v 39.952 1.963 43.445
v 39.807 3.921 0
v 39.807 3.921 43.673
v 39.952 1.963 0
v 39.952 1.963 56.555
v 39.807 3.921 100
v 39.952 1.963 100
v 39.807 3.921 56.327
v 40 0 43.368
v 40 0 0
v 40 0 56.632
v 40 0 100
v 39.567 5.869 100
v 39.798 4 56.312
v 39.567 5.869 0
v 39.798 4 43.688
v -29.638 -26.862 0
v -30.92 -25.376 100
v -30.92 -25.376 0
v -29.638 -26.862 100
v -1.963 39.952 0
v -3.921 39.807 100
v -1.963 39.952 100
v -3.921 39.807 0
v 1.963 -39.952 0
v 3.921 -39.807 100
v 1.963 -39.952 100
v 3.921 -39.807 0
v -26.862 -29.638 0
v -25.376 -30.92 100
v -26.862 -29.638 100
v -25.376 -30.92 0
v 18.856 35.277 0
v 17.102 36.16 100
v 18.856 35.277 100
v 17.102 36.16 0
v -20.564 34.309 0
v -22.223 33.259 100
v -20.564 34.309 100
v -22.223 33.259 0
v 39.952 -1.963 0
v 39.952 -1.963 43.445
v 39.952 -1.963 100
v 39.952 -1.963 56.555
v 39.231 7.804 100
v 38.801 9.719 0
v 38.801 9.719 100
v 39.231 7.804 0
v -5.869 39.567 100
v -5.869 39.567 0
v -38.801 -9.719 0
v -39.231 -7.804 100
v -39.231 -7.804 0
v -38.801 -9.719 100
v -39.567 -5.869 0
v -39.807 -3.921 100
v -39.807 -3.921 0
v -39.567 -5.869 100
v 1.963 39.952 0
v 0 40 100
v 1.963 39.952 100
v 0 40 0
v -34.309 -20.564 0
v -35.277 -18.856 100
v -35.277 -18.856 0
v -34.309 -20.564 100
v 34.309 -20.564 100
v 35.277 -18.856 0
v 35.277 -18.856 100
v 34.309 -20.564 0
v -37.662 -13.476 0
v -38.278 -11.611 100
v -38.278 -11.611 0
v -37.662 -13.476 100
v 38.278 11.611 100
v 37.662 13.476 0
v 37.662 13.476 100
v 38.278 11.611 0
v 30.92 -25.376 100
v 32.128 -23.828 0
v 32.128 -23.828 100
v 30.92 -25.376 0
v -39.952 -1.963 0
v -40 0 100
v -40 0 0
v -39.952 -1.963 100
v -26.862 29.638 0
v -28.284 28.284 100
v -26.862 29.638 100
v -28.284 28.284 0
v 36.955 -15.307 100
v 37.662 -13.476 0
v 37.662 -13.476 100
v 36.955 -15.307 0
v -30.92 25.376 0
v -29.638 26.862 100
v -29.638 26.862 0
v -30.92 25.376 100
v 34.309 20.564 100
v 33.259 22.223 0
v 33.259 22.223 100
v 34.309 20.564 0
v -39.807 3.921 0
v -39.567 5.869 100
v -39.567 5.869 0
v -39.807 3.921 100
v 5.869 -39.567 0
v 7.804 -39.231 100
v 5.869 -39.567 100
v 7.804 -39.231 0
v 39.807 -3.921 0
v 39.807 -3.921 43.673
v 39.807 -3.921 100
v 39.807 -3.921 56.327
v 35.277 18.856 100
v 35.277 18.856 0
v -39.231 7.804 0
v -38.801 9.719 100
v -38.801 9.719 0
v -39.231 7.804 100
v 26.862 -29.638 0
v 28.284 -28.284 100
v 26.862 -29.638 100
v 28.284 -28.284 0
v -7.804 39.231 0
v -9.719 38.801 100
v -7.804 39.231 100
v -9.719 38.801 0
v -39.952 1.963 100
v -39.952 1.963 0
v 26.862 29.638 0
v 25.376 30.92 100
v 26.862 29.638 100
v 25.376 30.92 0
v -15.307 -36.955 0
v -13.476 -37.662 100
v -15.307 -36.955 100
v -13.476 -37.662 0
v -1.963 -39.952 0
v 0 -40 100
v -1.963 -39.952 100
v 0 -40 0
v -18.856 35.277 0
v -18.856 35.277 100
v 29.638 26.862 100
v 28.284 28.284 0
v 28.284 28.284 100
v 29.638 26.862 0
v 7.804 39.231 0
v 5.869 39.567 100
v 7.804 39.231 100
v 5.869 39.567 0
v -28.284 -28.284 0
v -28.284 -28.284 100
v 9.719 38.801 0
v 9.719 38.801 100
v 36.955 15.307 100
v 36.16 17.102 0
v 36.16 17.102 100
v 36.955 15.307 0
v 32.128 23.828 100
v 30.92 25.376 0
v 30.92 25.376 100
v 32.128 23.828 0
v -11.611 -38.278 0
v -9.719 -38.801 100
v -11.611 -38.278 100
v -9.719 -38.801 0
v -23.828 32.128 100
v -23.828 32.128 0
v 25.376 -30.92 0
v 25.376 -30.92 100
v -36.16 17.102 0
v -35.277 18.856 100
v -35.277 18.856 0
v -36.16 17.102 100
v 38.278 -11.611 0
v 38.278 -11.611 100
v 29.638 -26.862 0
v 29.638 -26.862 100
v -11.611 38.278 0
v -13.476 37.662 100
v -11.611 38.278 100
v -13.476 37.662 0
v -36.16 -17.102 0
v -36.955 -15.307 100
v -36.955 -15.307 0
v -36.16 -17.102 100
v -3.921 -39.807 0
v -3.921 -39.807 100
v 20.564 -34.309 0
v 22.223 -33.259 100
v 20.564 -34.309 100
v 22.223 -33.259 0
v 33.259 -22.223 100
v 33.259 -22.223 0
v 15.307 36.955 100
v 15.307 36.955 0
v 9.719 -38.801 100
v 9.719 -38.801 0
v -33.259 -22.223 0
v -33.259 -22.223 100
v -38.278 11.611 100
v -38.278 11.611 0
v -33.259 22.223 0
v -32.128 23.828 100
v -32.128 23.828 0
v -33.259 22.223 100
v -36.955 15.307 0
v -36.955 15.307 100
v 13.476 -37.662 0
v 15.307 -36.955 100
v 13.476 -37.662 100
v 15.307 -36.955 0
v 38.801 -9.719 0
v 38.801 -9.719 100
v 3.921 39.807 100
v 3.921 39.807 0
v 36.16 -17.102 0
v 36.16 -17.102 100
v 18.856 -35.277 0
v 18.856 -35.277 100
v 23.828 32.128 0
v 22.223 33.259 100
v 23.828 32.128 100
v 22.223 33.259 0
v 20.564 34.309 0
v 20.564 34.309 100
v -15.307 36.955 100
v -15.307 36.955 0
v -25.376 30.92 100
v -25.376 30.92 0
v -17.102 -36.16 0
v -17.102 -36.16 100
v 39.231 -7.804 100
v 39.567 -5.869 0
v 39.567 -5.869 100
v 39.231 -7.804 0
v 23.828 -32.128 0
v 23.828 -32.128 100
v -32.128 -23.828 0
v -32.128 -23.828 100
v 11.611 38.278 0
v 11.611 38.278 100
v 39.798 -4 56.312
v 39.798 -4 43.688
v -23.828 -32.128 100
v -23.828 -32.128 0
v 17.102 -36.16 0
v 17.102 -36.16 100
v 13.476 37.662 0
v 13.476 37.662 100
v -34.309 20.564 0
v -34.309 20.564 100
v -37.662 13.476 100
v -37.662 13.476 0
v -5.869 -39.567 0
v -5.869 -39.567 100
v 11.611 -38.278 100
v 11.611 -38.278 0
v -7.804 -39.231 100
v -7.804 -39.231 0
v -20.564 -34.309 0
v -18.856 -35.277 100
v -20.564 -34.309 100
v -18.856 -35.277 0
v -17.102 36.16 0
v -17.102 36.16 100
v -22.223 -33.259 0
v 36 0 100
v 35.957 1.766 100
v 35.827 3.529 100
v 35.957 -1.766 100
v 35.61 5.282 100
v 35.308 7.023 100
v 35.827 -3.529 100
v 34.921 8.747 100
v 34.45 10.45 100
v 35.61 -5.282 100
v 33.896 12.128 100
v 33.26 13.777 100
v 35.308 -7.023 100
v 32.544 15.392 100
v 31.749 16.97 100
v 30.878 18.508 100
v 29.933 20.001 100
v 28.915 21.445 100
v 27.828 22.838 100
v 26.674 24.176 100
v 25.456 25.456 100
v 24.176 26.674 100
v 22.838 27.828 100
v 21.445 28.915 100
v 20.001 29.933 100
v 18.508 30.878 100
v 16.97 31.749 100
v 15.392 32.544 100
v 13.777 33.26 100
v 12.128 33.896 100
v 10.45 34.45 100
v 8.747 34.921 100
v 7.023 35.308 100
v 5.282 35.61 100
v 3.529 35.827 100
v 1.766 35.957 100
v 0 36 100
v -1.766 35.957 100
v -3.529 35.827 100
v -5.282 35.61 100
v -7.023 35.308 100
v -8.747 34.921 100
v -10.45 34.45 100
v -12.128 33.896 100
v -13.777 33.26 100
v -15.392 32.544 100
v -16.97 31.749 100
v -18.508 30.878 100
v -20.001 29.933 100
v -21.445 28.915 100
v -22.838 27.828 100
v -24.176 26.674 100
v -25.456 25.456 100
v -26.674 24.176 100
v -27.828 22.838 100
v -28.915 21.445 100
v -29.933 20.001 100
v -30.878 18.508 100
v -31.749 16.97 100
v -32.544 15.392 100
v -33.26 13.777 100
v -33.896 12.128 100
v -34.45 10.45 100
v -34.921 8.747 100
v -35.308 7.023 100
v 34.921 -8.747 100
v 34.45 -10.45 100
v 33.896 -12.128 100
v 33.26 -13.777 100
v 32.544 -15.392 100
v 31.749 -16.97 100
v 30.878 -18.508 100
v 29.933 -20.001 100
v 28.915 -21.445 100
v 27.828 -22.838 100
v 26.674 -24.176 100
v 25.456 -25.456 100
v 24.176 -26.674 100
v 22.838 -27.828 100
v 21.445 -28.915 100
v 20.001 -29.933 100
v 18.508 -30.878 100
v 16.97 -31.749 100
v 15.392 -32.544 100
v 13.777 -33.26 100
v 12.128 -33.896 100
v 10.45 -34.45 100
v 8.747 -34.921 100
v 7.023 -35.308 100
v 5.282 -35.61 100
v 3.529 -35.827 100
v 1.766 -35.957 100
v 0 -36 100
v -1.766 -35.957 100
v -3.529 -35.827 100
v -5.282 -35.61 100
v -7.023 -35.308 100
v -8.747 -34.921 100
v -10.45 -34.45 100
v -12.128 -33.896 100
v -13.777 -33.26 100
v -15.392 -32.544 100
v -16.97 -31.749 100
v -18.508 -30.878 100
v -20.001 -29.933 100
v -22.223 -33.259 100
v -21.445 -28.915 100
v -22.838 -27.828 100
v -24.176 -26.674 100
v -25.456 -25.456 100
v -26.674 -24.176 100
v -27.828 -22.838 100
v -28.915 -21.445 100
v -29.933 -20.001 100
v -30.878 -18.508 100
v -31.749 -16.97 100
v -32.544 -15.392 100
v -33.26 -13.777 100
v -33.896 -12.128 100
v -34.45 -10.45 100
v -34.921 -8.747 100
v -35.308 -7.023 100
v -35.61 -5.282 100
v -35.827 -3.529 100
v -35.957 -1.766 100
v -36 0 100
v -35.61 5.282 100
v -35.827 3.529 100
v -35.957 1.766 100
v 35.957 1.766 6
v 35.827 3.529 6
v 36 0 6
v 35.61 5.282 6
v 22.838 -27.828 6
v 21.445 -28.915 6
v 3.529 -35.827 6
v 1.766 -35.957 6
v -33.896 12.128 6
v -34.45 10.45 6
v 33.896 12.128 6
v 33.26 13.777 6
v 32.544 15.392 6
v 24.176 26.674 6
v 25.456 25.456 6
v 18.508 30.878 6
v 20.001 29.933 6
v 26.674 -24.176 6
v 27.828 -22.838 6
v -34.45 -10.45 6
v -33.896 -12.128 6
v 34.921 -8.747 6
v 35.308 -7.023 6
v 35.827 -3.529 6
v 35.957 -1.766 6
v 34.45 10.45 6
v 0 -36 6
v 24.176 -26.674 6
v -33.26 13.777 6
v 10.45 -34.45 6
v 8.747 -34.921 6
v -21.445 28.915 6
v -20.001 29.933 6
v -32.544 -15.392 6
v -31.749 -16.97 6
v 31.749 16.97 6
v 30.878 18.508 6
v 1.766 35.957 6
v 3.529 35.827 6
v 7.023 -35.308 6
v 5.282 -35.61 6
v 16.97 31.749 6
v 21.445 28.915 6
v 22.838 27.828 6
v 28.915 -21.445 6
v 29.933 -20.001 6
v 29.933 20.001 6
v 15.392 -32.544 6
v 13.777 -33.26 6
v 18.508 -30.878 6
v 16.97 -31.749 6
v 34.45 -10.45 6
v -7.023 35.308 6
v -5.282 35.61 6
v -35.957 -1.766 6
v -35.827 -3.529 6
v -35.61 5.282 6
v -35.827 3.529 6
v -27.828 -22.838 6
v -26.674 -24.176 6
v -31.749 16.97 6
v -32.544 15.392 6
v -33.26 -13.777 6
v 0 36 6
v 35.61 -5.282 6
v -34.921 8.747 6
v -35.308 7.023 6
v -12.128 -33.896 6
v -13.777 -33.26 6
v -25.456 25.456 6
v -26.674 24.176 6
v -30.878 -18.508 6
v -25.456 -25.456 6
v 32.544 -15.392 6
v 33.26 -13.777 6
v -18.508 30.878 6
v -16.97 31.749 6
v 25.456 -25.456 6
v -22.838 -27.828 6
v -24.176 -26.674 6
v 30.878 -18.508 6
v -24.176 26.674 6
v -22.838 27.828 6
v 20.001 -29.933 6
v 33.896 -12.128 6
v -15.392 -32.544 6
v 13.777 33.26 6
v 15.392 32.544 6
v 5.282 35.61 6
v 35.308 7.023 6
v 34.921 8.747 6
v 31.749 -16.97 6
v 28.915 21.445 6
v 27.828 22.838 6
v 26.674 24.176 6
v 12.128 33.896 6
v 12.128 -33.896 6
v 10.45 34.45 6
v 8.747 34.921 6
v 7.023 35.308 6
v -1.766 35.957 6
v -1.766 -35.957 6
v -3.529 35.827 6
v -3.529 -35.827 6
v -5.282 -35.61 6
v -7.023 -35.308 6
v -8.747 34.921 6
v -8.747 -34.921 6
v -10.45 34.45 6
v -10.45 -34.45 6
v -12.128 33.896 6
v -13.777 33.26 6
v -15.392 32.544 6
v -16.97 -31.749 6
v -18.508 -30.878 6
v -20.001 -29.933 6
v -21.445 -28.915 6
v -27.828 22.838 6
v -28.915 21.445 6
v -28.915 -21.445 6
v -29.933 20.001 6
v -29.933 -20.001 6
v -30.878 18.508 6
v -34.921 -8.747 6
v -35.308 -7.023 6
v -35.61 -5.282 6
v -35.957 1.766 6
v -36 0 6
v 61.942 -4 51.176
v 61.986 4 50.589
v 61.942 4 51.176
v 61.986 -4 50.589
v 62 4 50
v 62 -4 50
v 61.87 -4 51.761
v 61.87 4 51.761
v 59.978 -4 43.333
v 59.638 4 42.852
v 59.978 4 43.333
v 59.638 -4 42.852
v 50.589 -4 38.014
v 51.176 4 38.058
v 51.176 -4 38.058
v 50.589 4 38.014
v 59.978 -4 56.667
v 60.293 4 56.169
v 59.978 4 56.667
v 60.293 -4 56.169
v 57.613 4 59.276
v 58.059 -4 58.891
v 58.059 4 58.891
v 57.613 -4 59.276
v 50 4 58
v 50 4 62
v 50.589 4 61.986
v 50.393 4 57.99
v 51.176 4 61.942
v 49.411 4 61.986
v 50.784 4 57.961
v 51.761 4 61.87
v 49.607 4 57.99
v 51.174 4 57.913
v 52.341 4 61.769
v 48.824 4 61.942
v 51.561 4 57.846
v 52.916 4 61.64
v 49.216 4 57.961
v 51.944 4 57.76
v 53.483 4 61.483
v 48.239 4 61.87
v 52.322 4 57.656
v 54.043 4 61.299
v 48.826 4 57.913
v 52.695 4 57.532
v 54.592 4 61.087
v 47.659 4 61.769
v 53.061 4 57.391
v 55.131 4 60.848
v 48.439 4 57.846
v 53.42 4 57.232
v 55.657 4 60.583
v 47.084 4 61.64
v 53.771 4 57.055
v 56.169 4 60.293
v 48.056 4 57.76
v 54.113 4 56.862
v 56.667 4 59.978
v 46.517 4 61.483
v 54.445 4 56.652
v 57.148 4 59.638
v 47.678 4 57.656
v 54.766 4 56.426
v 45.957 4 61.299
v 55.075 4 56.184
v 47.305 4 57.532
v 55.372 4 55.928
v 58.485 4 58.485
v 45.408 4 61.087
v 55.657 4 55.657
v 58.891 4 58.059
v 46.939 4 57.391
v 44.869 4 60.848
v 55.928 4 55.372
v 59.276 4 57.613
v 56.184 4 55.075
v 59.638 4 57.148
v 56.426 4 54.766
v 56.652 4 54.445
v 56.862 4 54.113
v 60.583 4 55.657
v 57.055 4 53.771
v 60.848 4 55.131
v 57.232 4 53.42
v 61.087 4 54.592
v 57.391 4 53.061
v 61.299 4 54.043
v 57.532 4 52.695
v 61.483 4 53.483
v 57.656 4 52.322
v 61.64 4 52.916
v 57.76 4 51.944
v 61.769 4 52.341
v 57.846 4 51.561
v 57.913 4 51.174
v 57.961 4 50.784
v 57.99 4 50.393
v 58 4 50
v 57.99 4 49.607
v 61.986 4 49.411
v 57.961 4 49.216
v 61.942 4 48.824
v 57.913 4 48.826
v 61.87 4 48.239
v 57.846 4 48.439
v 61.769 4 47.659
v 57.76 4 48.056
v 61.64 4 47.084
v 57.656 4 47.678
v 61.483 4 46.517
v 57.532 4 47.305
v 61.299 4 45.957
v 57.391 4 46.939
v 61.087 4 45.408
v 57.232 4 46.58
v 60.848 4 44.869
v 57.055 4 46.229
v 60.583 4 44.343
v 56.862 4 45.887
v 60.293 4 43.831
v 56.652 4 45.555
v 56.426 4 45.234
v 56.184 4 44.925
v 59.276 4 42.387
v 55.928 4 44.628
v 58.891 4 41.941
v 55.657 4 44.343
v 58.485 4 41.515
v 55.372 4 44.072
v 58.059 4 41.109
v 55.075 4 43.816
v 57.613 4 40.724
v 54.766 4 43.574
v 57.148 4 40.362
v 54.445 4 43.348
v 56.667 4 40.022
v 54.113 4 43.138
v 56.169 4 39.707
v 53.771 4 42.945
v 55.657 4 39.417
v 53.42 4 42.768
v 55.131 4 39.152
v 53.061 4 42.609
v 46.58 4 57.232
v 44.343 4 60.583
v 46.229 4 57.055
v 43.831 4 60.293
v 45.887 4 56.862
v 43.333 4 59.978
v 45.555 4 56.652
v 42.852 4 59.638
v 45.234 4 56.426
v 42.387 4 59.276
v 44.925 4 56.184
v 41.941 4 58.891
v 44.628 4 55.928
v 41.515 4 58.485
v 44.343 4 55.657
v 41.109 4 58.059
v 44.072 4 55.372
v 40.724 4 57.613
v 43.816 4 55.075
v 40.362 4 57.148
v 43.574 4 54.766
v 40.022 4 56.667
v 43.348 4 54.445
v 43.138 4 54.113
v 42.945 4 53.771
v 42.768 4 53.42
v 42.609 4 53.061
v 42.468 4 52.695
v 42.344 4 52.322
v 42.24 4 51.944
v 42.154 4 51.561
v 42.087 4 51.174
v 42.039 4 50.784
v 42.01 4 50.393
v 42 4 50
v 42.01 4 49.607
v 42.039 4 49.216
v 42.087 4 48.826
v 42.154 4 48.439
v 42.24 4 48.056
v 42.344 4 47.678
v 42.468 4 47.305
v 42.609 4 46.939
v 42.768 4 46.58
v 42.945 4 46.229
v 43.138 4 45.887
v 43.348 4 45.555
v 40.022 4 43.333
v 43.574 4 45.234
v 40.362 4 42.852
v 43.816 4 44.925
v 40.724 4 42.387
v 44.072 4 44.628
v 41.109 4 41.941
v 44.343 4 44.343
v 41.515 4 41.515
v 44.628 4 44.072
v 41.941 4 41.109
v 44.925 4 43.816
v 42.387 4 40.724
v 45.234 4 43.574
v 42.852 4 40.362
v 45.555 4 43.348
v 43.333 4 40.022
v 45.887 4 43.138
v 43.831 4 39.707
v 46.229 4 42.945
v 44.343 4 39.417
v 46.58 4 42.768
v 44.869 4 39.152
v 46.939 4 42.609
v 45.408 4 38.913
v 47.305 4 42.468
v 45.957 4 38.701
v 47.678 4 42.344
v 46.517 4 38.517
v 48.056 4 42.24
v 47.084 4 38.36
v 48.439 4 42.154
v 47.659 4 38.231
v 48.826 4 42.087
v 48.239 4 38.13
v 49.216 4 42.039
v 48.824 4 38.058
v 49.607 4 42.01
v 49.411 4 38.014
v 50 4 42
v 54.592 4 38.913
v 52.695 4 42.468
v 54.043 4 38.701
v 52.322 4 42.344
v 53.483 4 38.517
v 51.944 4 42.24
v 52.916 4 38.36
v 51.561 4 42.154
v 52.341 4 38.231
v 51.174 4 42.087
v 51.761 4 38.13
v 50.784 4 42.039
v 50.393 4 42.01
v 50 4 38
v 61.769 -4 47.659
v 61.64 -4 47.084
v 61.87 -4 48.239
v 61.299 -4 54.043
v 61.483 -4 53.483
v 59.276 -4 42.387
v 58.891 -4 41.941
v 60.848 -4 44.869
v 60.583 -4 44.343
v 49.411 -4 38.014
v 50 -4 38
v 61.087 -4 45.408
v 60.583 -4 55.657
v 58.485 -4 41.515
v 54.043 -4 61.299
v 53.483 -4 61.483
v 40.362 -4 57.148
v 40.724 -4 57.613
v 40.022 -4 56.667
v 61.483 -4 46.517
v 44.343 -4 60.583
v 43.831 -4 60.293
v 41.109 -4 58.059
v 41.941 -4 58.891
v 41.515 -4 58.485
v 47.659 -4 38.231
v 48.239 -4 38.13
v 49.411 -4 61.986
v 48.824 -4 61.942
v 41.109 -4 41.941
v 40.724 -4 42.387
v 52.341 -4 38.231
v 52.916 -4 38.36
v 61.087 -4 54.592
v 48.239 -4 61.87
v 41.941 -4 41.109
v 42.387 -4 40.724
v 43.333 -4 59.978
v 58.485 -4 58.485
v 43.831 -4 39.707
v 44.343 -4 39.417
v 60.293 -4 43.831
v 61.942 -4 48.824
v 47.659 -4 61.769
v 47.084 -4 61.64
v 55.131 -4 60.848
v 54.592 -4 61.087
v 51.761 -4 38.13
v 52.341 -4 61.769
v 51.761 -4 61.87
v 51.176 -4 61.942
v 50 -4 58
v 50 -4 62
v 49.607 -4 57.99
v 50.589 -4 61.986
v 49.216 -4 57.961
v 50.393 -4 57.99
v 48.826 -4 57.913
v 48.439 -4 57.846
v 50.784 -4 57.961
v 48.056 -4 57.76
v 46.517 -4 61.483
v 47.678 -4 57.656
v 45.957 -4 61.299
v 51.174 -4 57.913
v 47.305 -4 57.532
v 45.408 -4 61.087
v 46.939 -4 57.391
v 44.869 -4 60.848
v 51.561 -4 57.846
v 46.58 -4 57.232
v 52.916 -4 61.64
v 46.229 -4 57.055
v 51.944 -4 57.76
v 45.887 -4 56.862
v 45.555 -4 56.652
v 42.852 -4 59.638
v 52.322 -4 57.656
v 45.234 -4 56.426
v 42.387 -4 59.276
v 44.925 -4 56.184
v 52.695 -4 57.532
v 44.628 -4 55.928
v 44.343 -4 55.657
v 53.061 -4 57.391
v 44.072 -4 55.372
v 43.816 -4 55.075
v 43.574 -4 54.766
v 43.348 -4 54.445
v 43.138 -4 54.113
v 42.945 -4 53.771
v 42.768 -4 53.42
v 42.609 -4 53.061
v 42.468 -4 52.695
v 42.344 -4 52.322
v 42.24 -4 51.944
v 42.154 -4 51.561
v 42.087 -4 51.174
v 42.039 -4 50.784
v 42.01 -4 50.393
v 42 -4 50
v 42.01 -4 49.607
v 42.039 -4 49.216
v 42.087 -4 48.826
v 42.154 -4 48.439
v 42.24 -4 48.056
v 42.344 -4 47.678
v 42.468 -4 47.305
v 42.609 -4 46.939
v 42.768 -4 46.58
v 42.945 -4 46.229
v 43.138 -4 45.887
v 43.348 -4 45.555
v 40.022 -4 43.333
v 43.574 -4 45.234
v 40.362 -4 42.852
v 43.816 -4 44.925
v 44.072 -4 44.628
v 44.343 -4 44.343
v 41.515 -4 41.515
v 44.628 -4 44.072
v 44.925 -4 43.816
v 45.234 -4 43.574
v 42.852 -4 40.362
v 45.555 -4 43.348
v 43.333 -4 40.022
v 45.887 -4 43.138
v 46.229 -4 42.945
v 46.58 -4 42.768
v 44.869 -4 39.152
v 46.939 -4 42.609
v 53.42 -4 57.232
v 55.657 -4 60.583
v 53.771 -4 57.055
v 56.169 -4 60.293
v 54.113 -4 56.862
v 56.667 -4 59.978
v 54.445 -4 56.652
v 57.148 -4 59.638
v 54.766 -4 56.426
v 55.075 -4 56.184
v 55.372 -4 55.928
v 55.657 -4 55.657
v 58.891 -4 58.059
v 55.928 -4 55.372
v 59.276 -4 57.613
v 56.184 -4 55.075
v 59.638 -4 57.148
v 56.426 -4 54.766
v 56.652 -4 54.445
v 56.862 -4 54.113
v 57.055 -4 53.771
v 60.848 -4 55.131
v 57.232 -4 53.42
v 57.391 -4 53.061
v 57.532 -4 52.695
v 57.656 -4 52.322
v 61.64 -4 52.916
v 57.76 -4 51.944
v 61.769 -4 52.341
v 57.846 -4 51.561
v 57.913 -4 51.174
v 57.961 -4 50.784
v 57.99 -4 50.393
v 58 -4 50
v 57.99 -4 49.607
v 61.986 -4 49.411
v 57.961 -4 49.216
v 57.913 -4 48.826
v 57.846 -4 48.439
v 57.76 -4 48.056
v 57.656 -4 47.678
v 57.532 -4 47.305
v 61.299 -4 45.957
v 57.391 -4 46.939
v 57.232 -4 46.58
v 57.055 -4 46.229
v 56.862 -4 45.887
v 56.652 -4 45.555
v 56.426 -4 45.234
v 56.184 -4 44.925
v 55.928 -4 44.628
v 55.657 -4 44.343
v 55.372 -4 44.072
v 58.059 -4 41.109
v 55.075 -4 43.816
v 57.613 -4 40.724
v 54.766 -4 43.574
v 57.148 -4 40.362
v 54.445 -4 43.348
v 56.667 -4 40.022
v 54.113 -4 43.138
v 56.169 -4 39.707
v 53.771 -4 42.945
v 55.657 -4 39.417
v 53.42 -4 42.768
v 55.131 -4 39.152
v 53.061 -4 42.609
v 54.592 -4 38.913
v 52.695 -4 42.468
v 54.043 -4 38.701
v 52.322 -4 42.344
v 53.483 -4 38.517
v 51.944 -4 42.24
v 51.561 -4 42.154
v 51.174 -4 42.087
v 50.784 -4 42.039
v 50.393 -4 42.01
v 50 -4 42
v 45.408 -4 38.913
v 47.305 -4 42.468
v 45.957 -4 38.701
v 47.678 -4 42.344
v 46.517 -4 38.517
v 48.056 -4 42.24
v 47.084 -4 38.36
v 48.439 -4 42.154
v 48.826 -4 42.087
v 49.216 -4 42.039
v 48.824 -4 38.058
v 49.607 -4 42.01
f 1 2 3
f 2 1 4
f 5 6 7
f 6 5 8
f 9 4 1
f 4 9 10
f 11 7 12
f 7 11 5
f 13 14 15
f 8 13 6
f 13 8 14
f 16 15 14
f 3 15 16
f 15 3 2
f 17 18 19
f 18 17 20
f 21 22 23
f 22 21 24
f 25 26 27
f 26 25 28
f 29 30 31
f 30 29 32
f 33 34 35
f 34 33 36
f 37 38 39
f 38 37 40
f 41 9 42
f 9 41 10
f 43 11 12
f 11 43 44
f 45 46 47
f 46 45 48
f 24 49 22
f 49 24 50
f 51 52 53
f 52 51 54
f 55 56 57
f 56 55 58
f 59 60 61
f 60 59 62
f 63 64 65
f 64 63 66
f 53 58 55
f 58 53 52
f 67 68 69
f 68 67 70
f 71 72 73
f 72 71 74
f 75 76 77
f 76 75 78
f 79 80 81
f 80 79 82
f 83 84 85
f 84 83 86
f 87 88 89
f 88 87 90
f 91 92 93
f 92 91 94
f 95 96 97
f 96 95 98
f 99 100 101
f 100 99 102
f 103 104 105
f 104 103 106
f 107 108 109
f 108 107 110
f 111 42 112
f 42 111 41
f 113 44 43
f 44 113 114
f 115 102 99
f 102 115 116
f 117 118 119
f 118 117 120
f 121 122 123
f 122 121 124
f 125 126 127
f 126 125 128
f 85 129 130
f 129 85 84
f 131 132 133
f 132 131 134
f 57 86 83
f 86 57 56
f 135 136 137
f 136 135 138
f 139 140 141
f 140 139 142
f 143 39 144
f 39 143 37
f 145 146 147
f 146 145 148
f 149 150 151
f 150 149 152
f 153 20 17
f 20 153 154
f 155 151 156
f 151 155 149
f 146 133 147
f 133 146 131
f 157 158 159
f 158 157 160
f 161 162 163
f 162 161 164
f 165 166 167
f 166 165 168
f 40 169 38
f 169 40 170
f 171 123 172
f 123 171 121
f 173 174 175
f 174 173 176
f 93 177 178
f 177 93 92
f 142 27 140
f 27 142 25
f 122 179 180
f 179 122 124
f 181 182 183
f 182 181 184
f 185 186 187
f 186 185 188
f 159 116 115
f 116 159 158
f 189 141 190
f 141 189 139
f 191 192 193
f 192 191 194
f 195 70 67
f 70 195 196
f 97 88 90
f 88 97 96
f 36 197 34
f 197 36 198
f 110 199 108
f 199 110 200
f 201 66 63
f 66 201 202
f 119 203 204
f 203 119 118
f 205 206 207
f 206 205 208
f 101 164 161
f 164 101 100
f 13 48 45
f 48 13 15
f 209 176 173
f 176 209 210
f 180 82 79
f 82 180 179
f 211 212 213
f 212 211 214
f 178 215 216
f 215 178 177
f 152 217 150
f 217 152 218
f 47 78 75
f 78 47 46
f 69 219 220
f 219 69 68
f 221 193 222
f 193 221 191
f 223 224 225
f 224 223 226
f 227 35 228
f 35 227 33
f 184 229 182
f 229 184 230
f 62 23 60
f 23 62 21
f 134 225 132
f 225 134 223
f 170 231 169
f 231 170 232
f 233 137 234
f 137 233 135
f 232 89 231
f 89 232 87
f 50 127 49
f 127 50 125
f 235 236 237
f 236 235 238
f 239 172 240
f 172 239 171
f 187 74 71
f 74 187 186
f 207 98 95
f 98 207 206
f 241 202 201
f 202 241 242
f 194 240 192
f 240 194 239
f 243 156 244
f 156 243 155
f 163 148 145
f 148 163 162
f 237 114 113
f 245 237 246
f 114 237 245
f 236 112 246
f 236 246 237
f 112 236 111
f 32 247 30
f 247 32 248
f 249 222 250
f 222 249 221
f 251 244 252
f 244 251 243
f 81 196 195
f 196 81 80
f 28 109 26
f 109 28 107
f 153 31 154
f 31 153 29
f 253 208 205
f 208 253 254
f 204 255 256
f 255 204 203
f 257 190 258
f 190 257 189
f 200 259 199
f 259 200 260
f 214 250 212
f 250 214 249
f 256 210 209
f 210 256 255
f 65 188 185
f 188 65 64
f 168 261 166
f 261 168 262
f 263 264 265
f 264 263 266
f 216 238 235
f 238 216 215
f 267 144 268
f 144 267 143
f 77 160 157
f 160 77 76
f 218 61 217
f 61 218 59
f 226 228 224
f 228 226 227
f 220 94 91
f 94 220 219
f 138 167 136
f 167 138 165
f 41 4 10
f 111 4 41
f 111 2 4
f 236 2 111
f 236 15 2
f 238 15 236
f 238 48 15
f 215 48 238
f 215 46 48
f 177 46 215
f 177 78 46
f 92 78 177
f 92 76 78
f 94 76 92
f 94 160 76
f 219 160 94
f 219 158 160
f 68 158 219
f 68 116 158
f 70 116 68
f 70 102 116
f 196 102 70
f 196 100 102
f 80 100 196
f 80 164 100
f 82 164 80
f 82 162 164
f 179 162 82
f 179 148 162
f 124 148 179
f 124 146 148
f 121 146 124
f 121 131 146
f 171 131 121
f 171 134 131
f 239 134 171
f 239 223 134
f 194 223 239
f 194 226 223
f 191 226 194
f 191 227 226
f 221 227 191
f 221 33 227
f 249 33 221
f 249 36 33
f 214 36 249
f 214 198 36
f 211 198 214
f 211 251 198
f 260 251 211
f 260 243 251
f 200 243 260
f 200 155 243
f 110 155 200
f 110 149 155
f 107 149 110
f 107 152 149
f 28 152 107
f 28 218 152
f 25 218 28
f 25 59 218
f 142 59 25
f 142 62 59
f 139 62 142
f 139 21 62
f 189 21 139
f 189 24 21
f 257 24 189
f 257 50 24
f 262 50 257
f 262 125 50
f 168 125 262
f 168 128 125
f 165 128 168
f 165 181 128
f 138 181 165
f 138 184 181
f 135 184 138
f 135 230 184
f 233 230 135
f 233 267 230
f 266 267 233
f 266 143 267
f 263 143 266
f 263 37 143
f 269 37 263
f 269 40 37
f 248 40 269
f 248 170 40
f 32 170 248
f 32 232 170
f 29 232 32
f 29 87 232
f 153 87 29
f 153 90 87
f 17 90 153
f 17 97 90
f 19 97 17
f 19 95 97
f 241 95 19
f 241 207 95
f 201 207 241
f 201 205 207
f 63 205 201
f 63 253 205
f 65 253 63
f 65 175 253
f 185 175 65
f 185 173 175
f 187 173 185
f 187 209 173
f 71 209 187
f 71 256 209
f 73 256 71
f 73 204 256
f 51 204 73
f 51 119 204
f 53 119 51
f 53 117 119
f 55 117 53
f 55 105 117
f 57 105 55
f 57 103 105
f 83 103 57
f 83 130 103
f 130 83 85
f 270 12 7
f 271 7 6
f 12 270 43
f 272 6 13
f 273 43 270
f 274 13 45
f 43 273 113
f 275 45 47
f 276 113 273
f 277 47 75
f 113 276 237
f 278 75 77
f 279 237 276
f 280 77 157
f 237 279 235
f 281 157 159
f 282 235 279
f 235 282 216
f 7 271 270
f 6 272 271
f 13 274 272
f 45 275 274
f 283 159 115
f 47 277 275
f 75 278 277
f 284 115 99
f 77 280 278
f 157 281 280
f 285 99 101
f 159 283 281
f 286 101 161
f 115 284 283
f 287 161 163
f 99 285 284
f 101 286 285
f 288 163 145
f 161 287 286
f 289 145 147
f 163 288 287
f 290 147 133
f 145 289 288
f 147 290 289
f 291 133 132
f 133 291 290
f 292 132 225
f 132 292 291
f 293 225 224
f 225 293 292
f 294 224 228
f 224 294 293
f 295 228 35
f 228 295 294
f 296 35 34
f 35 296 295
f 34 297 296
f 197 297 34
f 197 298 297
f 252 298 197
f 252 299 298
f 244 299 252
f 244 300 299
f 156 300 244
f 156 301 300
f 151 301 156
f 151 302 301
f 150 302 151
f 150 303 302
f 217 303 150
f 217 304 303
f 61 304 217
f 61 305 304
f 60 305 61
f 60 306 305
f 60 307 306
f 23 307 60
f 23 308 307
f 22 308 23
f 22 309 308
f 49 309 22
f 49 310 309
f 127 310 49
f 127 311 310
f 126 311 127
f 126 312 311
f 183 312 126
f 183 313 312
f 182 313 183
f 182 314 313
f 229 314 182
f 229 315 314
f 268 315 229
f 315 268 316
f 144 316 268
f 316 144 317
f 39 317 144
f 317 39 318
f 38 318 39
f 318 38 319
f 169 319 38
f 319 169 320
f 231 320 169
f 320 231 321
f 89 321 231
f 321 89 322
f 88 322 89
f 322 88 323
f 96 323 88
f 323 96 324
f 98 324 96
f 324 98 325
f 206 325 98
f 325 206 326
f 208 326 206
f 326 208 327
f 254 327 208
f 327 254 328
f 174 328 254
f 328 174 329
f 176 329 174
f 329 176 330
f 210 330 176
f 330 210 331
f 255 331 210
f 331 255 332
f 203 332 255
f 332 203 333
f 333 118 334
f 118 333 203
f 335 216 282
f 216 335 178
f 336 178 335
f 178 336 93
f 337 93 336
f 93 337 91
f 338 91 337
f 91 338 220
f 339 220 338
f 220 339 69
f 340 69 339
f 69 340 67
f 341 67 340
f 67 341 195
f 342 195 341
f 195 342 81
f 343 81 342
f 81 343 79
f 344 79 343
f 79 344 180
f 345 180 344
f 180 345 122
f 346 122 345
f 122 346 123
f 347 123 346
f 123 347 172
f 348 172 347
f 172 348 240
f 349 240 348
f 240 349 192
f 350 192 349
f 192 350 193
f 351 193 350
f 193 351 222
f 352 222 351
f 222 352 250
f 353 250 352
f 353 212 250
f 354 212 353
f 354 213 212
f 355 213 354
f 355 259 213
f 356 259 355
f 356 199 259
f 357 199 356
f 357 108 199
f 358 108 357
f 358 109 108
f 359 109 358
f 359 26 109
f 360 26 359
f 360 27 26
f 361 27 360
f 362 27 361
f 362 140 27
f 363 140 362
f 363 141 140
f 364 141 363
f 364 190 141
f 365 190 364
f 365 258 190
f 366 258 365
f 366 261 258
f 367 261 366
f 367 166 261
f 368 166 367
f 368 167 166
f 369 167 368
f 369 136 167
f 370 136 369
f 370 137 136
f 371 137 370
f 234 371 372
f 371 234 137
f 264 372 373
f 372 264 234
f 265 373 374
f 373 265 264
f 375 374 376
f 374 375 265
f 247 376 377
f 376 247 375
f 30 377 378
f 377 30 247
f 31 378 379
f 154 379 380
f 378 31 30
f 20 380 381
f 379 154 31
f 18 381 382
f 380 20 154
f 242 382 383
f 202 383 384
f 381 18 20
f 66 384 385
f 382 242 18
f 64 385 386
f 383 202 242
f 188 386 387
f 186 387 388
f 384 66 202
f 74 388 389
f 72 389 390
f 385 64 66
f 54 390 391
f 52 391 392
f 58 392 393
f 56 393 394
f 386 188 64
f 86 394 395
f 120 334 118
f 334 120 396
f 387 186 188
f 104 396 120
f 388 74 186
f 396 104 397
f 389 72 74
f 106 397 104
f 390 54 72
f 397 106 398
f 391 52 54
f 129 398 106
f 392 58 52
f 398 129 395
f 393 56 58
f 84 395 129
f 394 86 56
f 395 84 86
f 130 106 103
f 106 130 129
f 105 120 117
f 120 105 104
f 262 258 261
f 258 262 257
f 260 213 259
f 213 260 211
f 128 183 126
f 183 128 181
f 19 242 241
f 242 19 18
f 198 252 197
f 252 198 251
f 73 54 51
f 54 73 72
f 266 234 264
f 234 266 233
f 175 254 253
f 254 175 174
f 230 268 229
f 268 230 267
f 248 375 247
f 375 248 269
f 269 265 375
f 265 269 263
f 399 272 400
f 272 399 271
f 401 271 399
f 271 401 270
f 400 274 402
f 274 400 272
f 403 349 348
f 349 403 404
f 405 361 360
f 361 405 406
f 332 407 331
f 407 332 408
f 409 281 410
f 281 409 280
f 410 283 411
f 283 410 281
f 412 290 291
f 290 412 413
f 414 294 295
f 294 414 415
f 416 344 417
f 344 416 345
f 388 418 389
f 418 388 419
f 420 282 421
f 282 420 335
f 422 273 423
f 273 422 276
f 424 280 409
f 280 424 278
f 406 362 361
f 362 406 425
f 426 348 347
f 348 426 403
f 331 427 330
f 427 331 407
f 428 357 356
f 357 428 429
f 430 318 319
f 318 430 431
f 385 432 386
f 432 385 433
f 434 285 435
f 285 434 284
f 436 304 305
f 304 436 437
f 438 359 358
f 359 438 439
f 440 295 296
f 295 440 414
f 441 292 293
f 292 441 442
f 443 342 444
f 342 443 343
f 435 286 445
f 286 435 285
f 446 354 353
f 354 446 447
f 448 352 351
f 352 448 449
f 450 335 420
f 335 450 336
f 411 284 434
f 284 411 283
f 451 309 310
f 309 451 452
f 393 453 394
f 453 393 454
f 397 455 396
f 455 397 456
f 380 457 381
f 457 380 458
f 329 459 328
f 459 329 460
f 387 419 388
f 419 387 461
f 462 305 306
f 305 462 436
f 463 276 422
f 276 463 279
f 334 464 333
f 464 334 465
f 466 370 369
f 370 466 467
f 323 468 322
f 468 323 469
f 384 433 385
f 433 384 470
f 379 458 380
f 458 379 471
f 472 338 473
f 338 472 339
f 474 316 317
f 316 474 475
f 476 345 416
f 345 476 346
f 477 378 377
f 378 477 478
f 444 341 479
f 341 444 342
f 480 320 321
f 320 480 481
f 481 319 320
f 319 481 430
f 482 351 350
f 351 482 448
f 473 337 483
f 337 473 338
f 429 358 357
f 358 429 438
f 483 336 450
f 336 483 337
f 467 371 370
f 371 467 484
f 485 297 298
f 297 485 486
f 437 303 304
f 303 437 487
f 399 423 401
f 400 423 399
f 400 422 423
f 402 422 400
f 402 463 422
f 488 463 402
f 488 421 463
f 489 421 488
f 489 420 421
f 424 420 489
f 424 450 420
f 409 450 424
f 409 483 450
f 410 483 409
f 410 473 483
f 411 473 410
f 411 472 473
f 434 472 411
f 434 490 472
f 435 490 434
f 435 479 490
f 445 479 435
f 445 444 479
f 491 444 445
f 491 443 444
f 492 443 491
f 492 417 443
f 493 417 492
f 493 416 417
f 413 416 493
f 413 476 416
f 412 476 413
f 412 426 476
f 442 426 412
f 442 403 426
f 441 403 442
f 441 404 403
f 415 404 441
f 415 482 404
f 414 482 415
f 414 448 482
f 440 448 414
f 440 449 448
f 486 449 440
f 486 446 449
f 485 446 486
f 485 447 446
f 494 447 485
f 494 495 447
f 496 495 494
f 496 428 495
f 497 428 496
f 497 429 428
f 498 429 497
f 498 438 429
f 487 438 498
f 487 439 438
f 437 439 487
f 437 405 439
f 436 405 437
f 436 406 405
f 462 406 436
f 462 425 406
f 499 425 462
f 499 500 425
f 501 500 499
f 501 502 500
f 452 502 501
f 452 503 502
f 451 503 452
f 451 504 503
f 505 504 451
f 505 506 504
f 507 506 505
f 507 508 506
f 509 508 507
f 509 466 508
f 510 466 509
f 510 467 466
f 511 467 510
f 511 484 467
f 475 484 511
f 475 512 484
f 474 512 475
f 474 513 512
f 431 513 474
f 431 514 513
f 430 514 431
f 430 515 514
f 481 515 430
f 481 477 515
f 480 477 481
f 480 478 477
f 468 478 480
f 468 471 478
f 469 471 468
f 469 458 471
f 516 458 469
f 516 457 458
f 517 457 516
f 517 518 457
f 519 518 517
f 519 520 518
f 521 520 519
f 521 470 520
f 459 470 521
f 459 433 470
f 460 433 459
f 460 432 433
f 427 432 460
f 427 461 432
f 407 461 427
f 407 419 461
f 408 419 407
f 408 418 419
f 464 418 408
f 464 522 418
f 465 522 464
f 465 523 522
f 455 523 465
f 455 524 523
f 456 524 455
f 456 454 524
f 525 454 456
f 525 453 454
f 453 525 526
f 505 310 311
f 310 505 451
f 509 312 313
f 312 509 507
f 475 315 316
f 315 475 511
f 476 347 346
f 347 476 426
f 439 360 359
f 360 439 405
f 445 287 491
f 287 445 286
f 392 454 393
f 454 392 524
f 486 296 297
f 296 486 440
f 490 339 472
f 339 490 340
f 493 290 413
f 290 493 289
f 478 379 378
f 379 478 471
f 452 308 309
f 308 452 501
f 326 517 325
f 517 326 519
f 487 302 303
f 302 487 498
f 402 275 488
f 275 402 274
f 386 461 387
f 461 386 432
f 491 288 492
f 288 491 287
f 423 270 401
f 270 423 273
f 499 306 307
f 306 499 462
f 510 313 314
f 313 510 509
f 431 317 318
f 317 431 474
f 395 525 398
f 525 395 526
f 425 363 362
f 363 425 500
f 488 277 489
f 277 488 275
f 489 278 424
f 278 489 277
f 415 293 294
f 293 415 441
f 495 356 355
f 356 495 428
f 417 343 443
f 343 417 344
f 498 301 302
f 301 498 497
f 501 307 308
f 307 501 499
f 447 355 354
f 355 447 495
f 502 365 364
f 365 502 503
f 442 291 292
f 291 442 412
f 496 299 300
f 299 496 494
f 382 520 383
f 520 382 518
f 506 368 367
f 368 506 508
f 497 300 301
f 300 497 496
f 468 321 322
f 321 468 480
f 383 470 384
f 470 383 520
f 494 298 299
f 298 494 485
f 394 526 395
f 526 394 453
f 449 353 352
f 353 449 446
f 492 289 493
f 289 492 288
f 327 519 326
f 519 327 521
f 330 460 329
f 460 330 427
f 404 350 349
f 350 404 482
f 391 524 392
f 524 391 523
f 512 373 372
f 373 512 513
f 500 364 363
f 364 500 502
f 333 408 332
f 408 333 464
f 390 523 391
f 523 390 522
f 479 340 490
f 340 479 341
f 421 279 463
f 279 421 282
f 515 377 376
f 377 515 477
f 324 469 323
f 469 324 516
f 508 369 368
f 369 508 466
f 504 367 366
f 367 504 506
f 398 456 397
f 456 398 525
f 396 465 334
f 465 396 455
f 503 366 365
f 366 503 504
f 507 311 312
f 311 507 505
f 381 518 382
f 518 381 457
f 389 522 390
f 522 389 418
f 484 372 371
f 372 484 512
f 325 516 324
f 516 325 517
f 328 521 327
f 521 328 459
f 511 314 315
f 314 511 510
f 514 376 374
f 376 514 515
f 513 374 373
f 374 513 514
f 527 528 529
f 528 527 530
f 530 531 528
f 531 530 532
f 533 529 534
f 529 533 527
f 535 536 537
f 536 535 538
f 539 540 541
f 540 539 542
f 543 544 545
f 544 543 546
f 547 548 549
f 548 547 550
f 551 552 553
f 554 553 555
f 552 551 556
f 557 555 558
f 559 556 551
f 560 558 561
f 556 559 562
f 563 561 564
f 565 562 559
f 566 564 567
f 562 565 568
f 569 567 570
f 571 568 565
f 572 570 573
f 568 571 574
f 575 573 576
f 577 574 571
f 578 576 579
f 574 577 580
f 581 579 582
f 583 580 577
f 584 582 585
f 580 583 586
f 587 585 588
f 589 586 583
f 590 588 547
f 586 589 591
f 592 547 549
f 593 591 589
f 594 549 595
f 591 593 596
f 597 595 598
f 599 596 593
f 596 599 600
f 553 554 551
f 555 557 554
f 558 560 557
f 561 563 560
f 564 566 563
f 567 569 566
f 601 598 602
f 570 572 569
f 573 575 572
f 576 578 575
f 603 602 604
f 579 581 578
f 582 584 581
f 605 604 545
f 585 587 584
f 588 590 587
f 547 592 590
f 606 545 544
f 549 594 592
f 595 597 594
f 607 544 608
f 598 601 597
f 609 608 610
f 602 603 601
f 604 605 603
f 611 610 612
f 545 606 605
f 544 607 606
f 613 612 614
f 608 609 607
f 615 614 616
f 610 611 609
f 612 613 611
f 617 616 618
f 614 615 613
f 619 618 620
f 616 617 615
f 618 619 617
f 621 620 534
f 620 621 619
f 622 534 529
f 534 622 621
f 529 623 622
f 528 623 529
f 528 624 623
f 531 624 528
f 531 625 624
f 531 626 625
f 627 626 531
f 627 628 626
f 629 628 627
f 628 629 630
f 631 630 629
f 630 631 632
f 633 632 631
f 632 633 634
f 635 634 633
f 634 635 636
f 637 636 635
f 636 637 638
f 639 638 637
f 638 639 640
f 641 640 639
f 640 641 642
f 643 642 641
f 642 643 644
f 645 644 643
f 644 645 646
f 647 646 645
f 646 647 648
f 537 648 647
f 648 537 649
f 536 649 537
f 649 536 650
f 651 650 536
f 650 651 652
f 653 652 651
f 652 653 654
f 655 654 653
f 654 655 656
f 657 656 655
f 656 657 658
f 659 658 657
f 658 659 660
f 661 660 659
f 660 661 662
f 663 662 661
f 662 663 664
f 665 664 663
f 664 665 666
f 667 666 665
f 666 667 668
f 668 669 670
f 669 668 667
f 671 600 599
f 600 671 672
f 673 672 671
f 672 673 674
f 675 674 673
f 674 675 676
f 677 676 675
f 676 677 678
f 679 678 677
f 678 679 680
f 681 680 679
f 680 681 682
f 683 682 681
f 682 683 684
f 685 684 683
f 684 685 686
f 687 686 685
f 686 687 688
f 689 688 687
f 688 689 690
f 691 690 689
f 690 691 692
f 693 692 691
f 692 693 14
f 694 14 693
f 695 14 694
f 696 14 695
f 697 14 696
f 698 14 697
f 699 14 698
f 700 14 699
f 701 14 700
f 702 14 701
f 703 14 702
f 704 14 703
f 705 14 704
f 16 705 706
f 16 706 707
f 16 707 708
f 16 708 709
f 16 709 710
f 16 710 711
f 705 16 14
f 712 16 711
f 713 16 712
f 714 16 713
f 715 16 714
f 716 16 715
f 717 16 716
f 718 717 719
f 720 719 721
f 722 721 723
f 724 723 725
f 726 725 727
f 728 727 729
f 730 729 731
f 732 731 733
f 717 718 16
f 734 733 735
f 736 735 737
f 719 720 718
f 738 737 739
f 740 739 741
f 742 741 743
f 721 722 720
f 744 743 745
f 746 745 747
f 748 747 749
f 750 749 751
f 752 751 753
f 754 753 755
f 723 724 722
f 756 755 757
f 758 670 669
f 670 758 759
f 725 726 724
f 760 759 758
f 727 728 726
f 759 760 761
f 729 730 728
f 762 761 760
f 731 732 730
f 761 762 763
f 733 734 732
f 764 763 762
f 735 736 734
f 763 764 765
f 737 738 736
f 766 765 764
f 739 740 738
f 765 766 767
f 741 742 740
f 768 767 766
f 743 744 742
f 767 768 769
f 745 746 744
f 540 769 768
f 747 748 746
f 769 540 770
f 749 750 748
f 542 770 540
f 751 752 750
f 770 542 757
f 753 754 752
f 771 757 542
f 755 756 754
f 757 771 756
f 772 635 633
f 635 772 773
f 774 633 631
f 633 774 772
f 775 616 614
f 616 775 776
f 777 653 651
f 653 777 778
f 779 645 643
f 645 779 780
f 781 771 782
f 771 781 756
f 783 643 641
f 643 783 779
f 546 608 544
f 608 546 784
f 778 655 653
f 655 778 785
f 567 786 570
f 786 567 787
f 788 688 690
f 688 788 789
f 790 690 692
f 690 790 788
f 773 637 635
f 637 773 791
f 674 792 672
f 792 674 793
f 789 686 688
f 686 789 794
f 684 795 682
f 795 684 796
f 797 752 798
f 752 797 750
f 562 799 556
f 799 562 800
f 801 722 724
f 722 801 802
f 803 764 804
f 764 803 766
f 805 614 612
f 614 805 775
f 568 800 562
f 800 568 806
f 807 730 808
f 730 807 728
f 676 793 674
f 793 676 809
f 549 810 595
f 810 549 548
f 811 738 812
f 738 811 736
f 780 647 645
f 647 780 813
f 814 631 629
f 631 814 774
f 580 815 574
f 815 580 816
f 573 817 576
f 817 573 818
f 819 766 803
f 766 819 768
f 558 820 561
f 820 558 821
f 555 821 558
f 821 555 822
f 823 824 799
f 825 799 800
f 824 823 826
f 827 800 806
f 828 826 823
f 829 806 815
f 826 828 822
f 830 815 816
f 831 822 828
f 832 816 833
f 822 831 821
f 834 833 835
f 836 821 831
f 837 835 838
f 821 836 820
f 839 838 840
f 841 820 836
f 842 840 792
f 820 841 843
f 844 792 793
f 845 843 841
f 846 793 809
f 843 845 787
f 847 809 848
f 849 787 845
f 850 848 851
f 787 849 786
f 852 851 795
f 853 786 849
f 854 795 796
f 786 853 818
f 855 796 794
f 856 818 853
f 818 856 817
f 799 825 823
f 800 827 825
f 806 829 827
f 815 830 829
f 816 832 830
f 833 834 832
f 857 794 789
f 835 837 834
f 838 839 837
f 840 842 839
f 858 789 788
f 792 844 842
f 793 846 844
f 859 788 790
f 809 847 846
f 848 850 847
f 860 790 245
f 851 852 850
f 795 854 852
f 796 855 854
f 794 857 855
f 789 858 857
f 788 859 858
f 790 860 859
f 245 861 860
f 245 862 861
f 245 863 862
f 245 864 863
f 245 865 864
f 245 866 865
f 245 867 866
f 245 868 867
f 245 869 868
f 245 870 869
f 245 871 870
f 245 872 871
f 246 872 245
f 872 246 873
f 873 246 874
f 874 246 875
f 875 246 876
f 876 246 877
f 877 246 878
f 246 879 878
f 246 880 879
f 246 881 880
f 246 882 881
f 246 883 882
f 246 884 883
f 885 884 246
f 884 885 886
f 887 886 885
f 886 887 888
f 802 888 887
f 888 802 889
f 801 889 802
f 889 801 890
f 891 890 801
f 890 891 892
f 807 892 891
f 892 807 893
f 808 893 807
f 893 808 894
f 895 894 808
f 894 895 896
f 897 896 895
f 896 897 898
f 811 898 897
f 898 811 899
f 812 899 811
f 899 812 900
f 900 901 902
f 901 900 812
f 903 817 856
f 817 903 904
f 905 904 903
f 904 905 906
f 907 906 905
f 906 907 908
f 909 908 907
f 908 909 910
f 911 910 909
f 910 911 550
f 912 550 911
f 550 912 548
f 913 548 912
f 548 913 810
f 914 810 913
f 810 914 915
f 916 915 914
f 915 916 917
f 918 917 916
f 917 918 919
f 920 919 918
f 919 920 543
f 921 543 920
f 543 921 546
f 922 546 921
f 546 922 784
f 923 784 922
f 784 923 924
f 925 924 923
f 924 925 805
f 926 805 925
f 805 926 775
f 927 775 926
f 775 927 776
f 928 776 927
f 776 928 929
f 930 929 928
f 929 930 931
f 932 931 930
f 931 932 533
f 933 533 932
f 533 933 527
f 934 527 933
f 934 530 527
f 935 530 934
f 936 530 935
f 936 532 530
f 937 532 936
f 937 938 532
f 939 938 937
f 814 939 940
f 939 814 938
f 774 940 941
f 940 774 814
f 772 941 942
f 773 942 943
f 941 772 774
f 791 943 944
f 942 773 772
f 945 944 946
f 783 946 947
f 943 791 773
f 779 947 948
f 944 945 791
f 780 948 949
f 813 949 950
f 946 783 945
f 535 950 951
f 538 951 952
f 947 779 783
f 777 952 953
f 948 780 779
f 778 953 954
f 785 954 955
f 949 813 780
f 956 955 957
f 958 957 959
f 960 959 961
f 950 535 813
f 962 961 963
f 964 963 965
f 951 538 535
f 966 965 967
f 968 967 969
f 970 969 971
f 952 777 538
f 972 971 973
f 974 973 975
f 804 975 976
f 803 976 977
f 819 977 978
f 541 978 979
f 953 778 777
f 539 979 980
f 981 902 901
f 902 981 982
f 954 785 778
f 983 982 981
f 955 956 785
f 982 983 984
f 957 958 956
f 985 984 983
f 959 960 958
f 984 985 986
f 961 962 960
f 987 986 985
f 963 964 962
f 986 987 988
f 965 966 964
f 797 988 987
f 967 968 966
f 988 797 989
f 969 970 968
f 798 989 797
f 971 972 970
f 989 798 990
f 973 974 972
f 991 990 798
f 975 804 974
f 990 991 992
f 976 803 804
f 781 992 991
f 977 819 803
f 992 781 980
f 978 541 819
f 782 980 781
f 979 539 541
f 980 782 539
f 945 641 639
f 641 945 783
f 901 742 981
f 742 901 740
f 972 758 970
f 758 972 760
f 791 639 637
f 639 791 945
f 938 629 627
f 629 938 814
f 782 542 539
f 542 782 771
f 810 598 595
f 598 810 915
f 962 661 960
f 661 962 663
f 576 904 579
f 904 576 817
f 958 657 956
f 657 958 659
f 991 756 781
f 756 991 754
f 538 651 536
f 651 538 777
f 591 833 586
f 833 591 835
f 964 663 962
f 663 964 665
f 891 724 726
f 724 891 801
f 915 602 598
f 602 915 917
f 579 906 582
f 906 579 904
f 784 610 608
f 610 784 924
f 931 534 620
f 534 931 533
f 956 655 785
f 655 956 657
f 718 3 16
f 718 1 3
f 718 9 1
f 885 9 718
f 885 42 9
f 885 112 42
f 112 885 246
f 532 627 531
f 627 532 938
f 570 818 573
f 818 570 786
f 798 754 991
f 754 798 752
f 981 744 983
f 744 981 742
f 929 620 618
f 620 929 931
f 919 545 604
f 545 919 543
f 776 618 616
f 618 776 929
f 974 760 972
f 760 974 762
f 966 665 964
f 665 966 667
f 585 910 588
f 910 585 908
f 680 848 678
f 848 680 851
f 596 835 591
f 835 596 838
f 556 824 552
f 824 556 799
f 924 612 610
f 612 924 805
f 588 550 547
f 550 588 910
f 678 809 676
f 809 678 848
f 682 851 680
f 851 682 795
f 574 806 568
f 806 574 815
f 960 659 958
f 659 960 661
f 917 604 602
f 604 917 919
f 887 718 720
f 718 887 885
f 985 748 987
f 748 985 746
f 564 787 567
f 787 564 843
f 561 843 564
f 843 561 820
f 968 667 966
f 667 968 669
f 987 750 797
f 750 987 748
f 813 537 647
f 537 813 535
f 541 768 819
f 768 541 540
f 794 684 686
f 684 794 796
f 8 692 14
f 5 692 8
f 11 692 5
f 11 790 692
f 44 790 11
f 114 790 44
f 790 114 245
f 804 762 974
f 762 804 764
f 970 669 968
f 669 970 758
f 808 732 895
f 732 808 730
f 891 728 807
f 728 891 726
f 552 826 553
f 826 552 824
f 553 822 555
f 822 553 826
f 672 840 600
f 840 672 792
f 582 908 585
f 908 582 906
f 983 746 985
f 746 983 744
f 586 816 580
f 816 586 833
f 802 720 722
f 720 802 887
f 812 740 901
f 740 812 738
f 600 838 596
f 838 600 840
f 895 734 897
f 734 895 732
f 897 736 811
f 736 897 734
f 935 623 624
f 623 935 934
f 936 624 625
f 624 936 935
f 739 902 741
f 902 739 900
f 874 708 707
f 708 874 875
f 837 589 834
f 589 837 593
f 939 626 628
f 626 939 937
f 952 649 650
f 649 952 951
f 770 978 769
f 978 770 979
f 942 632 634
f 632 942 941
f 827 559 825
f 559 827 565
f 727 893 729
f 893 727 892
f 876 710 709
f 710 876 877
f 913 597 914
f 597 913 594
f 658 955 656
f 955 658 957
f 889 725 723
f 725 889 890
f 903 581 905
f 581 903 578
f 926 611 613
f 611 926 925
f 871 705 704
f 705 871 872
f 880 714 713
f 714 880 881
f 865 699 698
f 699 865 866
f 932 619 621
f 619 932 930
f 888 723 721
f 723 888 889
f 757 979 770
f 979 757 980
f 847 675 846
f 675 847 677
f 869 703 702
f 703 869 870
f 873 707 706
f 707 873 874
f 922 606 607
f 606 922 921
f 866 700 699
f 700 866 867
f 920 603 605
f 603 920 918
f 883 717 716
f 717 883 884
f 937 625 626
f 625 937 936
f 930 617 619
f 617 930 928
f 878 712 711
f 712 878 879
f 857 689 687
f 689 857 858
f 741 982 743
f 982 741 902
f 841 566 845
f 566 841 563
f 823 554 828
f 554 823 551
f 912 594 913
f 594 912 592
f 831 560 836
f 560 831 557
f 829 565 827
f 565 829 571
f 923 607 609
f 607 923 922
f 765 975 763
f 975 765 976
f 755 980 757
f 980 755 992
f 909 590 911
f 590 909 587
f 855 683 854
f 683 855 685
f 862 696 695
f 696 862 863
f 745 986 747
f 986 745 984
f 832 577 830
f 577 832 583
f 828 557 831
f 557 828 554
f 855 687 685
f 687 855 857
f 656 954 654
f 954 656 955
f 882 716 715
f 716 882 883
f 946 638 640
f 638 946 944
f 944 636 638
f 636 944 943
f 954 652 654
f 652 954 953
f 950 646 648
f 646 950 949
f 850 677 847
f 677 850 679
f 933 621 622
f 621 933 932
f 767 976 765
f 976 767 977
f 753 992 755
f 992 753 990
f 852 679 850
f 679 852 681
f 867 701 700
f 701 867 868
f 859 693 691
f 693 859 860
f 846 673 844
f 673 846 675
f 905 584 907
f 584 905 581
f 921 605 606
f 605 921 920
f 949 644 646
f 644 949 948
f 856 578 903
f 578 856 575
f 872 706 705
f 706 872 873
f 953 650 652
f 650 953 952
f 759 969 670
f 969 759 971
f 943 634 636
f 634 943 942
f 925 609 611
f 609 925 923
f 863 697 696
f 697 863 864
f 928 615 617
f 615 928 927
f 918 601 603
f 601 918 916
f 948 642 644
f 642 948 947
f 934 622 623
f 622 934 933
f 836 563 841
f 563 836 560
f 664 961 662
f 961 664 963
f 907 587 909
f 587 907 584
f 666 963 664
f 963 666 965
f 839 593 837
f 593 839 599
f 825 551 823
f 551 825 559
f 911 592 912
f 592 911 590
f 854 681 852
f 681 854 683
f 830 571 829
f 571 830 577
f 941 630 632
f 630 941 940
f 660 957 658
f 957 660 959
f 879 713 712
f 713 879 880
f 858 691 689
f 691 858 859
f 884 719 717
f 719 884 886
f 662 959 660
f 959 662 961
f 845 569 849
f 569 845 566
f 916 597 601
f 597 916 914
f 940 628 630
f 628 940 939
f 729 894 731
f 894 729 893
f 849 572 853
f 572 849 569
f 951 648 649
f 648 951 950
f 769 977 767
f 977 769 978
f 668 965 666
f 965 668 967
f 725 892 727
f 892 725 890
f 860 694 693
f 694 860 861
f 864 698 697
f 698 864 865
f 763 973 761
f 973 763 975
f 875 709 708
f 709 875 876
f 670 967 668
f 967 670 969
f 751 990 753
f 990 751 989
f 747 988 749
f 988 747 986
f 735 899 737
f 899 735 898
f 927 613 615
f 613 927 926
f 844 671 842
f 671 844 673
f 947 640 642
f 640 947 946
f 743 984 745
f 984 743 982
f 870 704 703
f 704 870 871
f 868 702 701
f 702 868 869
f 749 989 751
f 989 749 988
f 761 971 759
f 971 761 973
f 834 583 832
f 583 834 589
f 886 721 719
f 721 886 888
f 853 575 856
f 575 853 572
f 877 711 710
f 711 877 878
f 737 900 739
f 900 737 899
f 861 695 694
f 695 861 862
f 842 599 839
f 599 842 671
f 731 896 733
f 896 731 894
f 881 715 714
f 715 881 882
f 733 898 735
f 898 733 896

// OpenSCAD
$fn = 128;

outer_radius = 40;
wall_thickness = 4;
inner_radius = outer_radius - wall_thickness;
cup_height = 100;
bottom_thickness = 6;

handle_outer_radius = 12;
handle_inner_radius = 8;
handle_thickness = 8;
handle_center_x = outer_radius + handle_outer_radius - 2;
handle_center_z = cup_height / 2;

union() {
    difference() {
        cylinder(r = outer_radius, h = cup_height);

        translate([0, 0, bottom_thickness])
            cylinder(
                r = inner_radius,
                h = cup_height - bottom_thickness + 1
            );
    }

    translate([handle_center_x, 0, handle_center_z])
        rotate([90, 0, 0])
            difference() {
                cylinder(
                    r = handle_outer_radius,
                    h = handle_thickness,
                    center = true
                );

                cylinder(
                    r = handle_inner_radius,
                    h = handle_thickness + 2,
                    center = true
                );
            }
}
